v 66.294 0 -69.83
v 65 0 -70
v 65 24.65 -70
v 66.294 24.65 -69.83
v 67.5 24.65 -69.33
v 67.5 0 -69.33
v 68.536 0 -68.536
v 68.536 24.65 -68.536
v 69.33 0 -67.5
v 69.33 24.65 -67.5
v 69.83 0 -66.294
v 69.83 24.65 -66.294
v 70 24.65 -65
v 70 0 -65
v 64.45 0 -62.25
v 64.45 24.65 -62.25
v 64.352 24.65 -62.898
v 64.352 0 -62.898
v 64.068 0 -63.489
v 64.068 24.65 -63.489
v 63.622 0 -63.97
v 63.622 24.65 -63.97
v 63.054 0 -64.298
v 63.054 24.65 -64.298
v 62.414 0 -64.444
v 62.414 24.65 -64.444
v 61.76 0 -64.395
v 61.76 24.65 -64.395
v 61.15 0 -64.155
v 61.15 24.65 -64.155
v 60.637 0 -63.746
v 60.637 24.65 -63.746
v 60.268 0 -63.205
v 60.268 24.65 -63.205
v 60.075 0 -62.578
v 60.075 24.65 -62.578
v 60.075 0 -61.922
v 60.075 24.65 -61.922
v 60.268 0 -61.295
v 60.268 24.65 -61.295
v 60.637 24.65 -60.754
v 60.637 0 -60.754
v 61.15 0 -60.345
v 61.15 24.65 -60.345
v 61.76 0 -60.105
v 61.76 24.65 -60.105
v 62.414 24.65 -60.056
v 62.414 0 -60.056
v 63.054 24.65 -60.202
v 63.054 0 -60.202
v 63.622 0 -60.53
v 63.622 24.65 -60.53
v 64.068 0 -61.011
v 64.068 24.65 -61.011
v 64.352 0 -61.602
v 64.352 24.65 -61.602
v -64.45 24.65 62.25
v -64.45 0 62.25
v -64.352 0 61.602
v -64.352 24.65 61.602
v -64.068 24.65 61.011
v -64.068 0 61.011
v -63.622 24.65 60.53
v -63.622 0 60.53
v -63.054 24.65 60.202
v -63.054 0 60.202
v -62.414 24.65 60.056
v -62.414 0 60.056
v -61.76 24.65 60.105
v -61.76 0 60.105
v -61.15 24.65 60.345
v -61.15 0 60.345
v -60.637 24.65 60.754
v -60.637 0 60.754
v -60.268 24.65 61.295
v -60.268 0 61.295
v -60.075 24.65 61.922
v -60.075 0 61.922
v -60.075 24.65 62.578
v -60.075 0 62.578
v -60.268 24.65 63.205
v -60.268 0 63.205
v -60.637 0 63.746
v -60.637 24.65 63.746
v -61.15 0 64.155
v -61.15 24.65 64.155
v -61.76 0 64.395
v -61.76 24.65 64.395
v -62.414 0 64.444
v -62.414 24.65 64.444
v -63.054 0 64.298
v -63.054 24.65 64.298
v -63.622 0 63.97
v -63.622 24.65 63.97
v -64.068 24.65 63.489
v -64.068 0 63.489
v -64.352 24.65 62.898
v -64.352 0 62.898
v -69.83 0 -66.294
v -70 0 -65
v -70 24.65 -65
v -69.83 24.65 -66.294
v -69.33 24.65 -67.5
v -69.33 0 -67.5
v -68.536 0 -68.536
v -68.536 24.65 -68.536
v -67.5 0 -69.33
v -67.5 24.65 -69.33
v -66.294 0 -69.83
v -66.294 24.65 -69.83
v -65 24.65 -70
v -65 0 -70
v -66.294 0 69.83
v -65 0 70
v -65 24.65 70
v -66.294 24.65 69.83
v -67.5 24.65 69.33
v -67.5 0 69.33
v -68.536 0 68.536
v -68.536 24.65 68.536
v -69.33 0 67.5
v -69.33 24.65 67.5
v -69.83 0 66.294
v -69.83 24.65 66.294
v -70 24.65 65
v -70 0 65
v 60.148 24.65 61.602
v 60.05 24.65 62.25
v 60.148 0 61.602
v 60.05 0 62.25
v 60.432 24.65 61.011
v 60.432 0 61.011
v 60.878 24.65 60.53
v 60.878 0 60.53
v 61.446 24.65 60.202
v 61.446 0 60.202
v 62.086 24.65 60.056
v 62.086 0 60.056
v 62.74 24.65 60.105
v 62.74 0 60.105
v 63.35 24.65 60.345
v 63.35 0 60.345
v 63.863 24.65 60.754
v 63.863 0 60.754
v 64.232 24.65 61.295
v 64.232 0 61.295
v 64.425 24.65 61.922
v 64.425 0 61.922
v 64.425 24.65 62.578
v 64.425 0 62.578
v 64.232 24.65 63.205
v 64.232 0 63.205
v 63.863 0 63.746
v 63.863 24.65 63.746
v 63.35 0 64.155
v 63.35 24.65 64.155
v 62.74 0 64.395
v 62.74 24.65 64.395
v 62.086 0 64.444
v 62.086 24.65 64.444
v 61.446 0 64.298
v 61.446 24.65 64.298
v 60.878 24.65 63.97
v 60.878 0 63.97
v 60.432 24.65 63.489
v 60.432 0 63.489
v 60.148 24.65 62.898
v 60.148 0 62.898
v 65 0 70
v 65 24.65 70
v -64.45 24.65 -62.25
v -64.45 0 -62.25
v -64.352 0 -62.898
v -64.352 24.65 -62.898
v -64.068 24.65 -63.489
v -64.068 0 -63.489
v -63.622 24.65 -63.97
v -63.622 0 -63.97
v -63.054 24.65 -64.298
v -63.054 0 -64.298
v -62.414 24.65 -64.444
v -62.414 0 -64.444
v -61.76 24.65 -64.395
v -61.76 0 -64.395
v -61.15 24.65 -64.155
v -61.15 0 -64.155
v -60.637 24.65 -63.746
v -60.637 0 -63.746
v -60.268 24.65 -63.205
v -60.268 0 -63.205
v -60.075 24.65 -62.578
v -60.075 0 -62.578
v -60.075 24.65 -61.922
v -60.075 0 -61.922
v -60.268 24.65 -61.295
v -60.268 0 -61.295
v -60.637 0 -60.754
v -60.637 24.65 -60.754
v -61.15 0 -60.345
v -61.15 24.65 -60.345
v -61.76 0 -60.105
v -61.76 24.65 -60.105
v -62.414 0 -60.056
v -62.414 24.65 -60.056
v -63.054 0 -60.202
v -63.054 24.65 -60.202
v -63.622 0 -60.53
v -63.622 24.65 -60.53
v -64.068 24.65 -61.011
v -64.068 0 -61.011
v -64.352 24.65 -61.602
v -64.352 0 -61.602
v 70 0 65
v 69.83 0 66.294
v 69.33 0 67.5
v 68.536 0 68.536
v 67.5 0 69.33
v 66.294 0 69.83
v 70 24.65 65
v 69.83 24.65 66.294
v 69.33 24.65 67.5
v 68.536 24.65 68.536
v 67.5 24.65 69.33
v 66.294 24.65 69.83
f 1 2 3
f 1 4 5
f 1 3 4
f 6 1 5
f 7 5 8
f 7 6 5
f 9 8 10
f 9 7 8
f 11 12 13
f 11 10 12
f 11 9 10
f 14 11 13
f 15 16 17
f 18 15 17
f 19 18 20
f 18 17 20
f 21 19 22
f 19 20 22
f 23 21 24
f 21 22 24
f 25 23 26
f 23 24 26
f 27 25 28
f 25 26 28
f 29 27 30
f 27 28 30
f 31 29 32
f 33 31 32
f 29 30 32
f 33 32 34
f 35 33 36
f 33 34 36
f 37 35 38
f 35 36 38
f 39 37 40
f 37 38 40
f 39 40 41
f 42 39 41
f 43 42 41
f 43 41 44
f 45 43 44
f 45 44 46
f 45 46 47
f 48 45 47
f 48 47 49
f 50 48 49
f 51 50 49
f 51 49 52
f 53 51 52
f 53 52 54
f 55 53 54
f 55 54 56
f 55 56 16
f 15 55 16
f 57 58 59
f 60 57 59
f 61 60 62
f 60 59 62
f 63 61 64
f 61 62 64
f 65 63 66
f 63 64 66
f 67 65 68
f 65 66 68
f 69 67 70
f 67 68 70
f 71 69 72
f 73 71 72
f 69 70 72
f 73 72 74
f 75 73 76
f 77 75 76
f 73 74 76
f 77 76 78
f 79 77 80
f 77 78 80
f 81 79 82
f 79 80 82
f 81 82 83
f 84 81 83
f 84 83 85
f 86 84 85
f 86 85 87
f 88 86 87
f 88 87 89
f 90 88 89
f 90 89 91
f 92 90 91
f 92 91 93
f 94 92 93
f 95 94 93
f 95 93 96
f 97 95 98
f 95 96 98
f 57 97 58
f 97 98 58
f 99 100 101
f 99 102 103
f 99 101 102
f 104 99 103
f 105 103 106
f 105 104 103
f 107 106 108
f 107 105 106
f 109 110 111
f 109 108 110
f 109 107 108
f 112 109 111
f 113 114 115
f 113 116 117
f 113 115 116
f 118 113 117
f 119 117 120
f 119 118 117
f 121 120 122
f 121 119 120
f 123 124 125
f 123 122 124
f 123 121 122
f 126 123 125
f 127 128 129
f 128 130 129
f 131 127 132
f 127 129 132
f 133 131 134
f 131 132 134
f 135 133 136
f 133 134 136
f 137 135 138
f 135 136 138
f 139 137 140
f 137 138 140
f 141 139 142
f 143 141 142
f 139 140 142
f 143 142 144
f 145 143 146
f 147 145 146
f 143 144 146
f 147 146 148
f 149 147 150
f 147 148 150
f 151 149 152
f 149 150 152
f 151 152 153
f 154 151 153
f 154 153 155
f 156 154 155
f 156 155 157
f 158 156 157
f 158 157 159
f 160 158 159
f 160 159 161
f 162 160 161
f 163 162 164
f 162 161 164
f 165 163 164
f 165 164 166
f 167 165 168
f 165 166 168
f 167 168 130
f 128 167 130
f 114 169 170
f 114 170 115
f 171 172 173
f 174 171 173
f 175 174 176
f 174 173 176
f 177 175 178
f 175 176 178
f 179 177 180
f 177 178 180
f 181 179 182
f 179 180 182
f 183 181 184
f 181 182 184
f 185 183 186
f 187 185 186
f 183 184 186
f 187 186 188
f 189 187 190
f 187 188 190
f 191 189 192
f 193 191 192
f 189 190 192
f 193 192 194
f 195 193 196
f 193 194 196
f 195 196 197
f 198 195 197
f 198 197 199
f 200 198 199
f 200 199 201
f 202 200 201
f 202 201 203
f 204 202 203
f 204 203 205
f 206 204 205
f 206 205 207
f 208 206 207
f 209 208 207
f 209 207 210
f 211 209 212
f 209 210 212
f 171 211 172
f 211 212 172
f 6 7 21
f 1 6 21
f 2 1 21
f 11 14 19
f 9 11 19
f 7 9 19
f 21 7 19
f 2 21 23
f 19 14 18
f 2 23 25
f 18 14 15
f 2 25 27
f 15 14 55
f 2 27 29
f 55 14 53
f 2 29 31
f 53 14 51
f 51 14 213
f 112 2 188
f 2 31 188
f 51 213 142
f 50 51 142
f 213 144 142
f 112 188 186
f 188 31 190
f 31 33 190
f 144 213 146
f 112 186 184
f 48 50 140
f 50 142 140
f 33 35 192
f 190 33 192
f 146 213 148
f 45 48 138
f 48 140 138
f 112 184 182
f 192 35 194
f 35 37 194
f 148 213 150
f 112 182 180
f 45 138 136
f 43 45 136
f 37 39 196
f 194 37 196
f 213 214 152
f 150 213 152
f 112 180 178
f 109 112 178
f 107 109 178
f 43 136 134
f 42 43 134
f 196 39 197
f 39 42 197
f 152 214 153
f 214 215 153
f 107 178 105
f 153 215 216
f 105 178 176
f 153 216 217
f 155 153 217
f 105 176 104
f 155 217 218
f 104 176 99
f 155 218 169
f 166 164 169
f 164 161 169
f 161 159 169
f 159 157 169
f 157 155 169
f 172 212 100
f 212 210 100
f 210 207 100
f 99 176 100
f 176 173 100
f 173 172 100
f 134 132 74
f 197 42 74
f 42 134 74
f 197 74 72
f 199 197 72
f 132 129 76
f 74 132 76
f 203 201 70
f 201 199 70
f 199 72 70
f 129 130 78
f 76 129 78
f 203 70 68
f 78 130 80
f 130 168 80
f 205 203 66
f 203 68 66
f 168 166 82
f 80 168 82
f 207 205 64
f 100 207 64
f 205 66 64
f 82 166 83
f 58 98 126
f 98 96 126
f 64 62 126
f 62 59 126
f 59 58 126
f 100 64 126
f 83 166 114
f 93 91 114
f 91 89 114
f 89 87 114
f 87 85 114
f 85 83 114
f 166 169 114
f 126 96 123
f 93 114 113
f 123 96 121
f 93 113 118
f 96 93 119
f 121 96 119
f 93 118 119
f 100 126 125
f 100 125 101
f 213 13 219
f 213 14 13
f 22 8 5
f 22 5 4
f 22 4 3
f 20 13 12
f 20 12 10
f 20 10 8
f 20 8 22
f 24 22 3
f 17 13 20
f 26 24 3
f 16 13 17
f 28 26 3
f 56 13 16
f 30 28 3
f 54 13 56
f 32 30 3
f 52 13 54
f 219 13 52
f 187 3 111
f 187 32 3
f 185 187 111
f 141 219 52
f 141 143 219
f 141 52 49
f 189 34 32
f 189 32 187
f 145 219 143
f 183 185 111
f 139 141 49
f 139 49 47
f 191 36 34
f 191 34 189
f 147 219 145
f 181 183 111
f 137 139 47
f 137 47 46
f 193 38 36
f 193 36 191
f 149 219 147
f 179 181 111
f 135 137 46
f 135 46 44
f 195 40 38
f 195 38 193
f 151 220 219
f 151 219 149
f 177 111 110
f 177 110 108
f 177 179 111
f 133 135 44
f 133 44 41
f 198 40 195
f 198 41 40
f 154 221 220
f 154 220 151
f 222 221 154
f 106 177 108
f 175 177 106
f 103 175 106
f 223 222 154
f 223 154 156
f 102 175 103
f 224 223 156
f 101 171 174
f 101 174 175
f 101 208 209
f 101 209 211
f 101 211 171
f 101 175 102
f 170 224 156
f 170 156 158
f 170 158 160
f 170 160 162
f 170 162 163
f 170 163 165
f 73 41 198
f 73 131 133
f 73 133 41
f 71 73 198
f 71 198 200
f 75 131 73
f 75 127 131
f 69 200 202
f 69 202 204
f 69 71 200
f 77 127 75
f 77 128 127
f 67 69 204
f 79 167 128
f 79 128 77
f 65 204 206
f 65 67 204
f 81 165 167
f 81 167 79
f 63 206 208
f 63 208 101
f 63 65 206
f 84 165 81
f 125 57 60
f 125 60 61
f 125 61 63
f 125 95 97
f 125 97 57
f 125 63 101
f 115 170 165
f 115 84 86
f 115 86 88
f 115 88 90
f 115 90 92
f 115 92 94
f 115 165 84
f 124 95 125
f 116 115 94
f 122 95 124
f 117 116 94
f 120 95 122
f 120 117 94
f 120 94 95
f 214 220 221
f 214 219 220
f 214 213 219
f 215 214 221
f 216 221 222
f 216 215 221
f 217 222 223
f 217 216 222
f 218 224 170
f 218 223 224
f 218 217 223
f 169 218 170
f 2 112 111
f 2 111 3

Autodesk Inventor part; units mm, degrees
ref_plane "YZ Plane" through (0, 0, 0) normal (1, 0, 0) x (0, 1, 0)
ref_plane "XZ Plane" through (0, 0, 0) normal (0, 1, 0) x (-1, 0, 0)
ref_plane "XY Plane" through (0, 0, 0) normal (0, 0, 1) x (1, 0, 0)
sketch "Sketch1" plane through (0, 0, 0) normal (0, 1, 0) x (-1, 0, 0)
  line L0 (-65, 70) -> (65, 70)
  line L1 (70, 65) -> (70, -65)
  line L2 (65, -70) -> (-65, -70)
  line L3 (-70, -65) -> (-70, 65)
  line L4 (-70, 70) -> (70, -70) construction
  line L5 (70, 70) -> (-70, -70) construction
  arc A0 (70, 65) -> (65, 70) centre (65, 65) ccw
  arc A1 (-65, 70) -> (-70, 65) centre (-65, 65) ccw
  arc A2 (-70, -65) -> (-65, -70) centre (-65, -65) ccw
  arc A3 (65, -70) -> (70, -65) centre (65, -65) ccw
  line L6 (0, 70) -> (0, 62.25)
  line L7 (70, 0) -> (62.25, 0)
  line L8 (0, -70) -> (0, -62.25)
  line L9 (-70, 0) -> (-62.25, 0)
  line L10 (-62.25, 62.25) -> (-62.25, -62.25)
  line L11 (-62.25, -62.25) -> (62.25, -62.25)
  line L12 (62.25, -62.25) -> (62.25, 62.25)
  line L13 (62.25, 62.25) -> (-62.25, 62.25)
  line L14 (-62.25, 62.25) -> (62.25, -62.25) construction
  line L15 (-62.25, -62.25) -> (62.25, 62.25) construction
  circle A4 centre (62.25, -62.25) radius 2.2
  circle A5 centre (-62.25, -62.25) radius 2.2
  circle A6 centre (-62.25, 62.25) radius 2.2
  circle A7 centre (62.25, 62.25) radius 2.2
  arc A8 (60.05, 62.25) -> (62.25, 60.05) centre (62.25, 62.25) ccw
  arc A9 (62.25, -60.05) -> (60.05, -62.25) centre (62.25, -62.25) ccw
  arc A10 (-60.05, -62.25) -> (-62.25, -60.05) centre (-62.25, -62.25) ccw
  arc A11 (-62.25, 60.05) -> (-60.05, 62.25) centre (-62.25, 62.25) ccw
  arc A12 (-60.05, -62.25) -> (-62.25, -60.05) centre (-62.25, -62.25) ccw
  point P0 (0, 0)
  dimension "d0" = 140
  dimension "d1" = 140
  dimension "d2" = 5
  dimension "d3" = 7.75
  dimension "d4" = 7.75
  dimension "d5" = 7.75
  dimension "d6" = 7.75
  dimension "d7" = 4.4
  dimension "d8" = 4.4
  dimension "d9" = 4.4
  dimension "d10" = 4.4
extrude "Extrusion1" add sketch "Sketch1" along normal blind 24.65 contours L0 L6 L13 A6 L10 L9 L3 A1 | L0 A0 L1 L7 L12 A7 L13 L6 | L13 A7 L12 A4 L11 A5 L10 A6 | L9 L10 A5 L11 L8 L2 A2 L3 | L1 A3 L2 L8 L11 A4 L12 L7 | A5 L11 L10 | L10 L11 A5
sketch "Sketch2" plane through (0, 24.65, 0) normal (0, 1, 0) x (1, 0, 0)
  circle A0 centre (62.25, -62.25) radius 2.2 projected
  line L0 (62.25, -62.25) -> (62.25, 62.25)
  line L1 (65, 70) -> (-65, 70) projected
  circle A1 centre (-62.25, 62.25) radius 2.2 projected
  line L2 (-62.25, 62.25) -> (62.25, 62.25)
  circle A2 centre (62.25, 62.25) radius 2.2
  point P0 (0, 0)
  dimension "d13" = 4.4
extrude "Extrusion2" cut sketch "Sketch2" against normal up to next contours A2 L2 L0 | L0 L2 A2
properties part number "BaseFan"
